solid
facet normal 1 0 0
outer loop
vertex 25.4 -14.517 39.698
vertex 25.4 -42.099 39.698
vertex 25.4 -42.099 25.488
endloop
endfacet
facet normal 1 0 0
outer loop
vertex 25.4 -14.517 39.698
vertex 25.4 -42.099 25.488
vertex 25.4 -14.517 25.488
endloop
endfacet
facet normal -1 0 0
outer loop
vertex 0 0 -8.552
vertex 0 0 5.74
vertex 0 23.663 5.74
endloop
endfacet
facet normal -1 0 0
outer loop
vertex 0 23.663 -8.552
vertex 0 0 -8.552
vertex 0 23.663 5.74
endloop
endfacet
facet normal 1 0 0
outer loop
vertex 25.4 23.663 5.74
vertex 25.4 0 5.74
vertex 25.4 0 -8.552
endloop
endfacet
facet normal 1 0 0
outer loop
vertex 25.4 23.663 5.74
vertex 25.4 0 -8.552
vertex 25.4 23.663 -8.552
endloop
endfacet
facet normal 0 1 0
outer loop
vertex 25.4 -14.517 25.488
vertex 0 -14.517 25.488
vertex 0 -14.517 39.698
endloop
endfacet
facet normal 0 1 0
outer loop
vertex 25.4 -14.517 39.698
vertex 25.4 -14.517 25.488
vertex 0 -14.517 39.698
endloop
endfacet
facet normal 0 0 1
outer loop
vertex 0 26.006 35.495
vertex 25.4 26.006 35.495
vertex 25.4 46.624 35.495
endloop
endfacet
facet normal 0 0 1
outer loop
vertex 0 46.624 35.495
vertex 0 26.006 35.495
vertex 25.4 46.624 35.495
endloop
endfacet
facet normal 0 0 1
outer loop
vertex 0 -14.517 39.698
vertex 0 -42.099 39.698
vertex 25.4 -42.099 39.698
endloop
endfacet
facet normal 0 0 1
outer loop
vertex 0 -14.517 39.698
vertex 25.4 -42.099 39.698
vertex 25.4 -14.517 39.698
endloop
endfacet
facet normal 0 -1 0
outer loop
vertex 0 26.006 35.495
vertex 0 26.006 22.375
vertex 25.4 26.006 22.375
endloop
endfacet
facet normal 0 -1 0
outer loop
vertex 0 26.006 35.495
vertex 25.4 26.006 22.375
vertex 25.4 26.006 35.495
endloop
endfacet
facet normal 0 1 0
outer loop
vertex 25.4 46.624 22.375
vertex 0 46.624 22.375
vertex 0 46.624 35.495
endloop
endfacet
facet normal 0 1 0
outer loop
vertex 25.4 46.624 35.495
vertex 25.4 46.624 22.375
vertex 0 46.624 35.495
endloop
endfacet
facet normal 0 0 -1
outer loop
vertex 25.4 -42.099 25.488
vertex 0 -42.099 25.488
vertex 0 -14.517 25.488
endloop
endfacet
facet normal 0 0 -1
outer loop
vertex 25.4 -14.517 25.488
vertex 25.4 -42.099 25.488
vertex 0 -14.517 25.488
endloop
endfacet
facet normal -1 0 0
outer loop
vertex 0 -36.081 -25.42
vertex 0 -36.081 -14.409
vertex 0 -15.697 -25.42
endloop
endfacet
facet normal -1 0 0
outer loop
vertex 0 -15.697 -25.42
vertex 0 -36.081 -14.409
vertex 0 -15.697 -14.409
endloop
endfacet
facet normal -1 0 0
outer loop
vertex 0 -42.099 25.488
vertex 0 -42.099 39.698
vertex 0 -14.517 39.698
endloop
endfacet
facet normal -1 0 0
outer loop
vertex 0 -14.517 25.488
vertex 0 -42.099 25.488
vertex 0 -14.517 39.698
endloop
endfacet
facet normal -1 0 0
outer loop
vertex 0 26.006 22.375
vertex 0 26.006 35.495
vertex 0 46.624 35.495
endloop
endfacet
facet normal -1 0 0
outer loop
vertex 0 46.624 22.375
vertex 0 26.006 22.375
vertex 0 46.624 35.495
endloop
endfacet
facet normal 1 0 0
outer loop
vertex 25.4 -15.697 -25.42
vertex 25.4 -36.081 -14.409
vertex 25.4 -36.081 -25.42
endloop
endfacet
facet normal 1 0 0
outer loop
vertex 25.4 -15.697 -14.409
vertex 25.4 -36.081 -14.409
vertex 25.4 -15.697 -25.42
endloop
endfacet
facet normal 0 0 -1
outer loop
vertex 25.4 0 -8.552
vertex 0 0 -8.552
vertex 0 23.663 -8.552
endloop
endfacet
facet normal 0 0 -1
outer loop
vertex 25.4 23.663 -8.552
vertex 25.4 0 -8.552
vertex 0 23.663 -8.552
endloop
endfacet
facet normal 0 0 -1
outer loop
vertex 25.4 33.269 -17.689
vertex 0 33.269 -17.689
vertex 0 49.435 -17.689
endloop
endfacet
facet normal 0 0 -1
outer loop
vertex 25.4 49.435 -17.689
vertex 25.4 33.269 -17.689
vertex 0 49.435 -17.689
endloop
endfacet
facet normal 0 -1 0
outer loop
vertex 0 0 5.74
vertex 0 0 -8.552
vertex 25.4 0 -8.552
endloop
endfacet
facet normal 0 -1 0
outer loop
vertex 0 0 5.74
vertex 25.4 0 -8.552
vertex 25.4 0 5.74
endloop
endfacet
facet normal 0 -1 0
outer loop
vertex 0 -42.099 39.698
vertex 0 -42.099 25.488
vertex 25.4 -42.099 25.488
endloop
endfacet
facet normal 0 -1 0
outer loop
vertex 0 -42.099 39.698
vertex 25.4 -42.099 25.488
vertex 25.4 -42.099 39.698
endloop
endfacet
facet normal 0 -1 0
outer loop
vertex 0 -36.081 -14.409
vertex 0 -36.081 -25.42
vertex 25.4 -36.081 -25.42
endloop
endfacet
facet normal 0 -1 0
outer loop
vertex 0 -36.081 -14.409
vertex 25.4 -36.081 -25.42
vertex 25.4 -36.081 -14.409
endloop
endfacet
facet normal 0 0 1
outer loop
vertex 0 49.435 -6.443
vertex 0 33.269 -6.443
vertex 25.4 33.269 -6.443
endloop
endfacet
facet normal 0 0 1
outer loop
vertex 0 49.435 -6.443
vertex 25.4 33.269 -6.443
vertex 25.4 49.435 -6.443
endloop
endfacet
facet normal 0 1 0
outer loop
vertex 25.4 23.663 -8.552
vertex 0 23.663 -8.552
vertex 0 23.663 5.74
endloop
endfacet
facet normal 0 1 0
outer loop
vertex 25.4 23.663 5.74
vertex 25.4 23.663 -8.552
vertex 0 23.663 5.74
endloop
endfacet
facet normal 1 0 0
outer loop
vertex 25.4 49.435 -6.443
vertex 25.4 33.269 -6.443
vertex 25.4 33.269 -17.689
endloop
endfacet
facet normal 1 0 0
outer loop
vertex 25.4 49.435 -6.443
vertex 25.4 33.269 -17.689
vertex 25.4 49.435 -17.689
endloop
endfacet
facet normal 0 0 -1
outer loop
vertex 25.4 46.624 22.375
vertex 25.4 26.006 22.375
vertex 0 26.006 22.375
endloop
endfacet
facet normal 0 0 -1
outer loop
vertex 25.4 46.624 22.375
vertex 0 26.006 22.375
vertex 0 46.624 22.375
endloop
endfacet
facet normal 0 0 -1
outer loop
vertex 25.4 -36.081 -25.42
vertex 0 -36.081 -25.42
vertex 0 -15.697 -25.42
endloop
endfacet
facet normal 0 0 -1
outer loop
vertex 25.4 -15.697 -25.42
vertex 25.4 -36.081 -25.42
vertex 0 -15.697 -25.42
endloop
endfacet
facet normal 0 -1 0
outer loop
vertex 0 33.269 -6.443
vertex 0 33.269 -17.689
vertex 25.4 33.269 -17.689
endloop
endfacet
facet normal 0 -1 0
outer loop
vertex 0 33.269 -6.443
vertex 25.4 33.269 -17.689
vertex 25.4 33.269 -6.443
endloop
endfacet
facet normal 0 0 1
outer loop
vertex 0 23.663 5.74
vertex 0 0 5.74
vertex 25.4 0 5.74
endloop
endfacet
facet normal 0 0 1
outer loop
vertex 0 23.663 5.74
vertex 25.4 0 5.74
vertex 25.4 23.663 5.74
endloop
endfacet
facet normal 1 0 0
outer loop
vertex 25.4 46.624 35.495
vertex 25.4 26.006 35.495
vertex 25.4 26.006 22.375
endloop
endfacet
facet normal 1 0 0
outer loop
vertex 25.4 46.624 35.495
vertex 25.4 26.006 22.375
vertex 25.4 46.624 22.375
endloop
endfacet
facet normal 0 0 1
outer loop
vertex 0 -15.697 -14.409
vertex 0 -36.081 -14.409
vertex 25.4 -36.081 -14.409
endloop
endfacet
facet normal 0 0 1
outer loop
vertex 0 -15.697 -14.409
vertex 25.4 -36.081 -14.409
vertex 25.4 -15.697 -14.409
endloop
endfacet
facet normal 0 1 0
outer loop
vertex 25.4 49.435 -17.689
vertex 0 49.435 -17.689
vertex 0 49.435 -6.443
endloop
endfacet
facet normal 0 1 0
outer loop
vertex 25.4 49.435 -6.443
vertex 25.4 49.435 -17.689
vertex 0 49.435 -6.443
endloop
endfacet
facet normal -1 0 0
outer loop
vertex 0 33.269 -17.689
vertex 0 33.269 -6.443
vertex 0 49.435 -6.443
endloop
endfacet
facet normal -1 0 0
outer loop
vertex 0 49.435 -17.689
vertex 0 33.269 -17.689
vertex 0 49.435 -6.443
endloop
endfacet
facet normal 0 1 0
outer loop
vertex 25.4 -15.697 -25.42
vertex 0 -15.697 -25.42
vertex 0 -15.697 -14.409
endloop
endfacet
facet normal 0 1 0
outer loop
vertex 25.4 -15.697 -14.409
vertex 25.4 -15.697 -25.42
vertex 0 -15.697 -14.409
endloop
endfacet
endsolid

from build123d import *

# Parameters (mm, degrees)
F0_W     = 27.582229
F0_H     = 14.210176
F1_DEPTH = 25.4
F2_W     = 20.617509
F2_H     = 13.120234
F6_DEPTH = 25.4
F3_W     = 16.166002
F3_H     = 11.245915
F7_DEPTH = 25.4
F5_W     = 23.663281
F5_H     = 14.291683
F8_DEPTH = 25.4
F4_W     = 20.383222
F4_H     = 11.011626
F9_DEPTH = 25.4


with BuildPart() as f1:
    # F0 (on Right) → F1 (new body)
    with BuildSketch(Plane.YZ):
        with Locations((-28.30807, 32.593055)):
            Rectangle(F0_W, F0_H)
    extrude(amount=F1_DEPTH)


with BuildPart() as f6:
    # F2 (on Right) → F6 (new body)
    with BuildSketch(Plane.YZ):
        with Locations((36.314934, 28.934803)):
            Rectangle(F2_W, F2_H)
    extrude(amount=F6_DEPTH)


with BuildPart() as f7:
    # F3 (on Right) → F7 (new body)
    with BuildSketch(Plane.YZ):
        with Locations((41.352168, -12.065929)):
            Rectangle(F3_W, F3_H)
    extrude(amount=F7_DEPTH)


with BuildPart() as f8:
    # F5 (on Right) → F8 (new body)
    with BuildSketch(Plane.YZ):
        with Locations((11.83164, -1.405739)):
            Rectangle(F5_W, F5_H)
    extrude(amount=F8_DEPTH)


with BuildPart() as f9:
    # F4 (on Right) → F9 (new body)
    with BuildSketch(Plane.YZ):
        with Locations((-25.889033, -19.914642)):
            Rectangle(F4_W, F4_H)
    extrude(amount=F9_DEPTH)


solid = Compound([f1.part, f6.part, f7.part, f8.part, f9.part])
